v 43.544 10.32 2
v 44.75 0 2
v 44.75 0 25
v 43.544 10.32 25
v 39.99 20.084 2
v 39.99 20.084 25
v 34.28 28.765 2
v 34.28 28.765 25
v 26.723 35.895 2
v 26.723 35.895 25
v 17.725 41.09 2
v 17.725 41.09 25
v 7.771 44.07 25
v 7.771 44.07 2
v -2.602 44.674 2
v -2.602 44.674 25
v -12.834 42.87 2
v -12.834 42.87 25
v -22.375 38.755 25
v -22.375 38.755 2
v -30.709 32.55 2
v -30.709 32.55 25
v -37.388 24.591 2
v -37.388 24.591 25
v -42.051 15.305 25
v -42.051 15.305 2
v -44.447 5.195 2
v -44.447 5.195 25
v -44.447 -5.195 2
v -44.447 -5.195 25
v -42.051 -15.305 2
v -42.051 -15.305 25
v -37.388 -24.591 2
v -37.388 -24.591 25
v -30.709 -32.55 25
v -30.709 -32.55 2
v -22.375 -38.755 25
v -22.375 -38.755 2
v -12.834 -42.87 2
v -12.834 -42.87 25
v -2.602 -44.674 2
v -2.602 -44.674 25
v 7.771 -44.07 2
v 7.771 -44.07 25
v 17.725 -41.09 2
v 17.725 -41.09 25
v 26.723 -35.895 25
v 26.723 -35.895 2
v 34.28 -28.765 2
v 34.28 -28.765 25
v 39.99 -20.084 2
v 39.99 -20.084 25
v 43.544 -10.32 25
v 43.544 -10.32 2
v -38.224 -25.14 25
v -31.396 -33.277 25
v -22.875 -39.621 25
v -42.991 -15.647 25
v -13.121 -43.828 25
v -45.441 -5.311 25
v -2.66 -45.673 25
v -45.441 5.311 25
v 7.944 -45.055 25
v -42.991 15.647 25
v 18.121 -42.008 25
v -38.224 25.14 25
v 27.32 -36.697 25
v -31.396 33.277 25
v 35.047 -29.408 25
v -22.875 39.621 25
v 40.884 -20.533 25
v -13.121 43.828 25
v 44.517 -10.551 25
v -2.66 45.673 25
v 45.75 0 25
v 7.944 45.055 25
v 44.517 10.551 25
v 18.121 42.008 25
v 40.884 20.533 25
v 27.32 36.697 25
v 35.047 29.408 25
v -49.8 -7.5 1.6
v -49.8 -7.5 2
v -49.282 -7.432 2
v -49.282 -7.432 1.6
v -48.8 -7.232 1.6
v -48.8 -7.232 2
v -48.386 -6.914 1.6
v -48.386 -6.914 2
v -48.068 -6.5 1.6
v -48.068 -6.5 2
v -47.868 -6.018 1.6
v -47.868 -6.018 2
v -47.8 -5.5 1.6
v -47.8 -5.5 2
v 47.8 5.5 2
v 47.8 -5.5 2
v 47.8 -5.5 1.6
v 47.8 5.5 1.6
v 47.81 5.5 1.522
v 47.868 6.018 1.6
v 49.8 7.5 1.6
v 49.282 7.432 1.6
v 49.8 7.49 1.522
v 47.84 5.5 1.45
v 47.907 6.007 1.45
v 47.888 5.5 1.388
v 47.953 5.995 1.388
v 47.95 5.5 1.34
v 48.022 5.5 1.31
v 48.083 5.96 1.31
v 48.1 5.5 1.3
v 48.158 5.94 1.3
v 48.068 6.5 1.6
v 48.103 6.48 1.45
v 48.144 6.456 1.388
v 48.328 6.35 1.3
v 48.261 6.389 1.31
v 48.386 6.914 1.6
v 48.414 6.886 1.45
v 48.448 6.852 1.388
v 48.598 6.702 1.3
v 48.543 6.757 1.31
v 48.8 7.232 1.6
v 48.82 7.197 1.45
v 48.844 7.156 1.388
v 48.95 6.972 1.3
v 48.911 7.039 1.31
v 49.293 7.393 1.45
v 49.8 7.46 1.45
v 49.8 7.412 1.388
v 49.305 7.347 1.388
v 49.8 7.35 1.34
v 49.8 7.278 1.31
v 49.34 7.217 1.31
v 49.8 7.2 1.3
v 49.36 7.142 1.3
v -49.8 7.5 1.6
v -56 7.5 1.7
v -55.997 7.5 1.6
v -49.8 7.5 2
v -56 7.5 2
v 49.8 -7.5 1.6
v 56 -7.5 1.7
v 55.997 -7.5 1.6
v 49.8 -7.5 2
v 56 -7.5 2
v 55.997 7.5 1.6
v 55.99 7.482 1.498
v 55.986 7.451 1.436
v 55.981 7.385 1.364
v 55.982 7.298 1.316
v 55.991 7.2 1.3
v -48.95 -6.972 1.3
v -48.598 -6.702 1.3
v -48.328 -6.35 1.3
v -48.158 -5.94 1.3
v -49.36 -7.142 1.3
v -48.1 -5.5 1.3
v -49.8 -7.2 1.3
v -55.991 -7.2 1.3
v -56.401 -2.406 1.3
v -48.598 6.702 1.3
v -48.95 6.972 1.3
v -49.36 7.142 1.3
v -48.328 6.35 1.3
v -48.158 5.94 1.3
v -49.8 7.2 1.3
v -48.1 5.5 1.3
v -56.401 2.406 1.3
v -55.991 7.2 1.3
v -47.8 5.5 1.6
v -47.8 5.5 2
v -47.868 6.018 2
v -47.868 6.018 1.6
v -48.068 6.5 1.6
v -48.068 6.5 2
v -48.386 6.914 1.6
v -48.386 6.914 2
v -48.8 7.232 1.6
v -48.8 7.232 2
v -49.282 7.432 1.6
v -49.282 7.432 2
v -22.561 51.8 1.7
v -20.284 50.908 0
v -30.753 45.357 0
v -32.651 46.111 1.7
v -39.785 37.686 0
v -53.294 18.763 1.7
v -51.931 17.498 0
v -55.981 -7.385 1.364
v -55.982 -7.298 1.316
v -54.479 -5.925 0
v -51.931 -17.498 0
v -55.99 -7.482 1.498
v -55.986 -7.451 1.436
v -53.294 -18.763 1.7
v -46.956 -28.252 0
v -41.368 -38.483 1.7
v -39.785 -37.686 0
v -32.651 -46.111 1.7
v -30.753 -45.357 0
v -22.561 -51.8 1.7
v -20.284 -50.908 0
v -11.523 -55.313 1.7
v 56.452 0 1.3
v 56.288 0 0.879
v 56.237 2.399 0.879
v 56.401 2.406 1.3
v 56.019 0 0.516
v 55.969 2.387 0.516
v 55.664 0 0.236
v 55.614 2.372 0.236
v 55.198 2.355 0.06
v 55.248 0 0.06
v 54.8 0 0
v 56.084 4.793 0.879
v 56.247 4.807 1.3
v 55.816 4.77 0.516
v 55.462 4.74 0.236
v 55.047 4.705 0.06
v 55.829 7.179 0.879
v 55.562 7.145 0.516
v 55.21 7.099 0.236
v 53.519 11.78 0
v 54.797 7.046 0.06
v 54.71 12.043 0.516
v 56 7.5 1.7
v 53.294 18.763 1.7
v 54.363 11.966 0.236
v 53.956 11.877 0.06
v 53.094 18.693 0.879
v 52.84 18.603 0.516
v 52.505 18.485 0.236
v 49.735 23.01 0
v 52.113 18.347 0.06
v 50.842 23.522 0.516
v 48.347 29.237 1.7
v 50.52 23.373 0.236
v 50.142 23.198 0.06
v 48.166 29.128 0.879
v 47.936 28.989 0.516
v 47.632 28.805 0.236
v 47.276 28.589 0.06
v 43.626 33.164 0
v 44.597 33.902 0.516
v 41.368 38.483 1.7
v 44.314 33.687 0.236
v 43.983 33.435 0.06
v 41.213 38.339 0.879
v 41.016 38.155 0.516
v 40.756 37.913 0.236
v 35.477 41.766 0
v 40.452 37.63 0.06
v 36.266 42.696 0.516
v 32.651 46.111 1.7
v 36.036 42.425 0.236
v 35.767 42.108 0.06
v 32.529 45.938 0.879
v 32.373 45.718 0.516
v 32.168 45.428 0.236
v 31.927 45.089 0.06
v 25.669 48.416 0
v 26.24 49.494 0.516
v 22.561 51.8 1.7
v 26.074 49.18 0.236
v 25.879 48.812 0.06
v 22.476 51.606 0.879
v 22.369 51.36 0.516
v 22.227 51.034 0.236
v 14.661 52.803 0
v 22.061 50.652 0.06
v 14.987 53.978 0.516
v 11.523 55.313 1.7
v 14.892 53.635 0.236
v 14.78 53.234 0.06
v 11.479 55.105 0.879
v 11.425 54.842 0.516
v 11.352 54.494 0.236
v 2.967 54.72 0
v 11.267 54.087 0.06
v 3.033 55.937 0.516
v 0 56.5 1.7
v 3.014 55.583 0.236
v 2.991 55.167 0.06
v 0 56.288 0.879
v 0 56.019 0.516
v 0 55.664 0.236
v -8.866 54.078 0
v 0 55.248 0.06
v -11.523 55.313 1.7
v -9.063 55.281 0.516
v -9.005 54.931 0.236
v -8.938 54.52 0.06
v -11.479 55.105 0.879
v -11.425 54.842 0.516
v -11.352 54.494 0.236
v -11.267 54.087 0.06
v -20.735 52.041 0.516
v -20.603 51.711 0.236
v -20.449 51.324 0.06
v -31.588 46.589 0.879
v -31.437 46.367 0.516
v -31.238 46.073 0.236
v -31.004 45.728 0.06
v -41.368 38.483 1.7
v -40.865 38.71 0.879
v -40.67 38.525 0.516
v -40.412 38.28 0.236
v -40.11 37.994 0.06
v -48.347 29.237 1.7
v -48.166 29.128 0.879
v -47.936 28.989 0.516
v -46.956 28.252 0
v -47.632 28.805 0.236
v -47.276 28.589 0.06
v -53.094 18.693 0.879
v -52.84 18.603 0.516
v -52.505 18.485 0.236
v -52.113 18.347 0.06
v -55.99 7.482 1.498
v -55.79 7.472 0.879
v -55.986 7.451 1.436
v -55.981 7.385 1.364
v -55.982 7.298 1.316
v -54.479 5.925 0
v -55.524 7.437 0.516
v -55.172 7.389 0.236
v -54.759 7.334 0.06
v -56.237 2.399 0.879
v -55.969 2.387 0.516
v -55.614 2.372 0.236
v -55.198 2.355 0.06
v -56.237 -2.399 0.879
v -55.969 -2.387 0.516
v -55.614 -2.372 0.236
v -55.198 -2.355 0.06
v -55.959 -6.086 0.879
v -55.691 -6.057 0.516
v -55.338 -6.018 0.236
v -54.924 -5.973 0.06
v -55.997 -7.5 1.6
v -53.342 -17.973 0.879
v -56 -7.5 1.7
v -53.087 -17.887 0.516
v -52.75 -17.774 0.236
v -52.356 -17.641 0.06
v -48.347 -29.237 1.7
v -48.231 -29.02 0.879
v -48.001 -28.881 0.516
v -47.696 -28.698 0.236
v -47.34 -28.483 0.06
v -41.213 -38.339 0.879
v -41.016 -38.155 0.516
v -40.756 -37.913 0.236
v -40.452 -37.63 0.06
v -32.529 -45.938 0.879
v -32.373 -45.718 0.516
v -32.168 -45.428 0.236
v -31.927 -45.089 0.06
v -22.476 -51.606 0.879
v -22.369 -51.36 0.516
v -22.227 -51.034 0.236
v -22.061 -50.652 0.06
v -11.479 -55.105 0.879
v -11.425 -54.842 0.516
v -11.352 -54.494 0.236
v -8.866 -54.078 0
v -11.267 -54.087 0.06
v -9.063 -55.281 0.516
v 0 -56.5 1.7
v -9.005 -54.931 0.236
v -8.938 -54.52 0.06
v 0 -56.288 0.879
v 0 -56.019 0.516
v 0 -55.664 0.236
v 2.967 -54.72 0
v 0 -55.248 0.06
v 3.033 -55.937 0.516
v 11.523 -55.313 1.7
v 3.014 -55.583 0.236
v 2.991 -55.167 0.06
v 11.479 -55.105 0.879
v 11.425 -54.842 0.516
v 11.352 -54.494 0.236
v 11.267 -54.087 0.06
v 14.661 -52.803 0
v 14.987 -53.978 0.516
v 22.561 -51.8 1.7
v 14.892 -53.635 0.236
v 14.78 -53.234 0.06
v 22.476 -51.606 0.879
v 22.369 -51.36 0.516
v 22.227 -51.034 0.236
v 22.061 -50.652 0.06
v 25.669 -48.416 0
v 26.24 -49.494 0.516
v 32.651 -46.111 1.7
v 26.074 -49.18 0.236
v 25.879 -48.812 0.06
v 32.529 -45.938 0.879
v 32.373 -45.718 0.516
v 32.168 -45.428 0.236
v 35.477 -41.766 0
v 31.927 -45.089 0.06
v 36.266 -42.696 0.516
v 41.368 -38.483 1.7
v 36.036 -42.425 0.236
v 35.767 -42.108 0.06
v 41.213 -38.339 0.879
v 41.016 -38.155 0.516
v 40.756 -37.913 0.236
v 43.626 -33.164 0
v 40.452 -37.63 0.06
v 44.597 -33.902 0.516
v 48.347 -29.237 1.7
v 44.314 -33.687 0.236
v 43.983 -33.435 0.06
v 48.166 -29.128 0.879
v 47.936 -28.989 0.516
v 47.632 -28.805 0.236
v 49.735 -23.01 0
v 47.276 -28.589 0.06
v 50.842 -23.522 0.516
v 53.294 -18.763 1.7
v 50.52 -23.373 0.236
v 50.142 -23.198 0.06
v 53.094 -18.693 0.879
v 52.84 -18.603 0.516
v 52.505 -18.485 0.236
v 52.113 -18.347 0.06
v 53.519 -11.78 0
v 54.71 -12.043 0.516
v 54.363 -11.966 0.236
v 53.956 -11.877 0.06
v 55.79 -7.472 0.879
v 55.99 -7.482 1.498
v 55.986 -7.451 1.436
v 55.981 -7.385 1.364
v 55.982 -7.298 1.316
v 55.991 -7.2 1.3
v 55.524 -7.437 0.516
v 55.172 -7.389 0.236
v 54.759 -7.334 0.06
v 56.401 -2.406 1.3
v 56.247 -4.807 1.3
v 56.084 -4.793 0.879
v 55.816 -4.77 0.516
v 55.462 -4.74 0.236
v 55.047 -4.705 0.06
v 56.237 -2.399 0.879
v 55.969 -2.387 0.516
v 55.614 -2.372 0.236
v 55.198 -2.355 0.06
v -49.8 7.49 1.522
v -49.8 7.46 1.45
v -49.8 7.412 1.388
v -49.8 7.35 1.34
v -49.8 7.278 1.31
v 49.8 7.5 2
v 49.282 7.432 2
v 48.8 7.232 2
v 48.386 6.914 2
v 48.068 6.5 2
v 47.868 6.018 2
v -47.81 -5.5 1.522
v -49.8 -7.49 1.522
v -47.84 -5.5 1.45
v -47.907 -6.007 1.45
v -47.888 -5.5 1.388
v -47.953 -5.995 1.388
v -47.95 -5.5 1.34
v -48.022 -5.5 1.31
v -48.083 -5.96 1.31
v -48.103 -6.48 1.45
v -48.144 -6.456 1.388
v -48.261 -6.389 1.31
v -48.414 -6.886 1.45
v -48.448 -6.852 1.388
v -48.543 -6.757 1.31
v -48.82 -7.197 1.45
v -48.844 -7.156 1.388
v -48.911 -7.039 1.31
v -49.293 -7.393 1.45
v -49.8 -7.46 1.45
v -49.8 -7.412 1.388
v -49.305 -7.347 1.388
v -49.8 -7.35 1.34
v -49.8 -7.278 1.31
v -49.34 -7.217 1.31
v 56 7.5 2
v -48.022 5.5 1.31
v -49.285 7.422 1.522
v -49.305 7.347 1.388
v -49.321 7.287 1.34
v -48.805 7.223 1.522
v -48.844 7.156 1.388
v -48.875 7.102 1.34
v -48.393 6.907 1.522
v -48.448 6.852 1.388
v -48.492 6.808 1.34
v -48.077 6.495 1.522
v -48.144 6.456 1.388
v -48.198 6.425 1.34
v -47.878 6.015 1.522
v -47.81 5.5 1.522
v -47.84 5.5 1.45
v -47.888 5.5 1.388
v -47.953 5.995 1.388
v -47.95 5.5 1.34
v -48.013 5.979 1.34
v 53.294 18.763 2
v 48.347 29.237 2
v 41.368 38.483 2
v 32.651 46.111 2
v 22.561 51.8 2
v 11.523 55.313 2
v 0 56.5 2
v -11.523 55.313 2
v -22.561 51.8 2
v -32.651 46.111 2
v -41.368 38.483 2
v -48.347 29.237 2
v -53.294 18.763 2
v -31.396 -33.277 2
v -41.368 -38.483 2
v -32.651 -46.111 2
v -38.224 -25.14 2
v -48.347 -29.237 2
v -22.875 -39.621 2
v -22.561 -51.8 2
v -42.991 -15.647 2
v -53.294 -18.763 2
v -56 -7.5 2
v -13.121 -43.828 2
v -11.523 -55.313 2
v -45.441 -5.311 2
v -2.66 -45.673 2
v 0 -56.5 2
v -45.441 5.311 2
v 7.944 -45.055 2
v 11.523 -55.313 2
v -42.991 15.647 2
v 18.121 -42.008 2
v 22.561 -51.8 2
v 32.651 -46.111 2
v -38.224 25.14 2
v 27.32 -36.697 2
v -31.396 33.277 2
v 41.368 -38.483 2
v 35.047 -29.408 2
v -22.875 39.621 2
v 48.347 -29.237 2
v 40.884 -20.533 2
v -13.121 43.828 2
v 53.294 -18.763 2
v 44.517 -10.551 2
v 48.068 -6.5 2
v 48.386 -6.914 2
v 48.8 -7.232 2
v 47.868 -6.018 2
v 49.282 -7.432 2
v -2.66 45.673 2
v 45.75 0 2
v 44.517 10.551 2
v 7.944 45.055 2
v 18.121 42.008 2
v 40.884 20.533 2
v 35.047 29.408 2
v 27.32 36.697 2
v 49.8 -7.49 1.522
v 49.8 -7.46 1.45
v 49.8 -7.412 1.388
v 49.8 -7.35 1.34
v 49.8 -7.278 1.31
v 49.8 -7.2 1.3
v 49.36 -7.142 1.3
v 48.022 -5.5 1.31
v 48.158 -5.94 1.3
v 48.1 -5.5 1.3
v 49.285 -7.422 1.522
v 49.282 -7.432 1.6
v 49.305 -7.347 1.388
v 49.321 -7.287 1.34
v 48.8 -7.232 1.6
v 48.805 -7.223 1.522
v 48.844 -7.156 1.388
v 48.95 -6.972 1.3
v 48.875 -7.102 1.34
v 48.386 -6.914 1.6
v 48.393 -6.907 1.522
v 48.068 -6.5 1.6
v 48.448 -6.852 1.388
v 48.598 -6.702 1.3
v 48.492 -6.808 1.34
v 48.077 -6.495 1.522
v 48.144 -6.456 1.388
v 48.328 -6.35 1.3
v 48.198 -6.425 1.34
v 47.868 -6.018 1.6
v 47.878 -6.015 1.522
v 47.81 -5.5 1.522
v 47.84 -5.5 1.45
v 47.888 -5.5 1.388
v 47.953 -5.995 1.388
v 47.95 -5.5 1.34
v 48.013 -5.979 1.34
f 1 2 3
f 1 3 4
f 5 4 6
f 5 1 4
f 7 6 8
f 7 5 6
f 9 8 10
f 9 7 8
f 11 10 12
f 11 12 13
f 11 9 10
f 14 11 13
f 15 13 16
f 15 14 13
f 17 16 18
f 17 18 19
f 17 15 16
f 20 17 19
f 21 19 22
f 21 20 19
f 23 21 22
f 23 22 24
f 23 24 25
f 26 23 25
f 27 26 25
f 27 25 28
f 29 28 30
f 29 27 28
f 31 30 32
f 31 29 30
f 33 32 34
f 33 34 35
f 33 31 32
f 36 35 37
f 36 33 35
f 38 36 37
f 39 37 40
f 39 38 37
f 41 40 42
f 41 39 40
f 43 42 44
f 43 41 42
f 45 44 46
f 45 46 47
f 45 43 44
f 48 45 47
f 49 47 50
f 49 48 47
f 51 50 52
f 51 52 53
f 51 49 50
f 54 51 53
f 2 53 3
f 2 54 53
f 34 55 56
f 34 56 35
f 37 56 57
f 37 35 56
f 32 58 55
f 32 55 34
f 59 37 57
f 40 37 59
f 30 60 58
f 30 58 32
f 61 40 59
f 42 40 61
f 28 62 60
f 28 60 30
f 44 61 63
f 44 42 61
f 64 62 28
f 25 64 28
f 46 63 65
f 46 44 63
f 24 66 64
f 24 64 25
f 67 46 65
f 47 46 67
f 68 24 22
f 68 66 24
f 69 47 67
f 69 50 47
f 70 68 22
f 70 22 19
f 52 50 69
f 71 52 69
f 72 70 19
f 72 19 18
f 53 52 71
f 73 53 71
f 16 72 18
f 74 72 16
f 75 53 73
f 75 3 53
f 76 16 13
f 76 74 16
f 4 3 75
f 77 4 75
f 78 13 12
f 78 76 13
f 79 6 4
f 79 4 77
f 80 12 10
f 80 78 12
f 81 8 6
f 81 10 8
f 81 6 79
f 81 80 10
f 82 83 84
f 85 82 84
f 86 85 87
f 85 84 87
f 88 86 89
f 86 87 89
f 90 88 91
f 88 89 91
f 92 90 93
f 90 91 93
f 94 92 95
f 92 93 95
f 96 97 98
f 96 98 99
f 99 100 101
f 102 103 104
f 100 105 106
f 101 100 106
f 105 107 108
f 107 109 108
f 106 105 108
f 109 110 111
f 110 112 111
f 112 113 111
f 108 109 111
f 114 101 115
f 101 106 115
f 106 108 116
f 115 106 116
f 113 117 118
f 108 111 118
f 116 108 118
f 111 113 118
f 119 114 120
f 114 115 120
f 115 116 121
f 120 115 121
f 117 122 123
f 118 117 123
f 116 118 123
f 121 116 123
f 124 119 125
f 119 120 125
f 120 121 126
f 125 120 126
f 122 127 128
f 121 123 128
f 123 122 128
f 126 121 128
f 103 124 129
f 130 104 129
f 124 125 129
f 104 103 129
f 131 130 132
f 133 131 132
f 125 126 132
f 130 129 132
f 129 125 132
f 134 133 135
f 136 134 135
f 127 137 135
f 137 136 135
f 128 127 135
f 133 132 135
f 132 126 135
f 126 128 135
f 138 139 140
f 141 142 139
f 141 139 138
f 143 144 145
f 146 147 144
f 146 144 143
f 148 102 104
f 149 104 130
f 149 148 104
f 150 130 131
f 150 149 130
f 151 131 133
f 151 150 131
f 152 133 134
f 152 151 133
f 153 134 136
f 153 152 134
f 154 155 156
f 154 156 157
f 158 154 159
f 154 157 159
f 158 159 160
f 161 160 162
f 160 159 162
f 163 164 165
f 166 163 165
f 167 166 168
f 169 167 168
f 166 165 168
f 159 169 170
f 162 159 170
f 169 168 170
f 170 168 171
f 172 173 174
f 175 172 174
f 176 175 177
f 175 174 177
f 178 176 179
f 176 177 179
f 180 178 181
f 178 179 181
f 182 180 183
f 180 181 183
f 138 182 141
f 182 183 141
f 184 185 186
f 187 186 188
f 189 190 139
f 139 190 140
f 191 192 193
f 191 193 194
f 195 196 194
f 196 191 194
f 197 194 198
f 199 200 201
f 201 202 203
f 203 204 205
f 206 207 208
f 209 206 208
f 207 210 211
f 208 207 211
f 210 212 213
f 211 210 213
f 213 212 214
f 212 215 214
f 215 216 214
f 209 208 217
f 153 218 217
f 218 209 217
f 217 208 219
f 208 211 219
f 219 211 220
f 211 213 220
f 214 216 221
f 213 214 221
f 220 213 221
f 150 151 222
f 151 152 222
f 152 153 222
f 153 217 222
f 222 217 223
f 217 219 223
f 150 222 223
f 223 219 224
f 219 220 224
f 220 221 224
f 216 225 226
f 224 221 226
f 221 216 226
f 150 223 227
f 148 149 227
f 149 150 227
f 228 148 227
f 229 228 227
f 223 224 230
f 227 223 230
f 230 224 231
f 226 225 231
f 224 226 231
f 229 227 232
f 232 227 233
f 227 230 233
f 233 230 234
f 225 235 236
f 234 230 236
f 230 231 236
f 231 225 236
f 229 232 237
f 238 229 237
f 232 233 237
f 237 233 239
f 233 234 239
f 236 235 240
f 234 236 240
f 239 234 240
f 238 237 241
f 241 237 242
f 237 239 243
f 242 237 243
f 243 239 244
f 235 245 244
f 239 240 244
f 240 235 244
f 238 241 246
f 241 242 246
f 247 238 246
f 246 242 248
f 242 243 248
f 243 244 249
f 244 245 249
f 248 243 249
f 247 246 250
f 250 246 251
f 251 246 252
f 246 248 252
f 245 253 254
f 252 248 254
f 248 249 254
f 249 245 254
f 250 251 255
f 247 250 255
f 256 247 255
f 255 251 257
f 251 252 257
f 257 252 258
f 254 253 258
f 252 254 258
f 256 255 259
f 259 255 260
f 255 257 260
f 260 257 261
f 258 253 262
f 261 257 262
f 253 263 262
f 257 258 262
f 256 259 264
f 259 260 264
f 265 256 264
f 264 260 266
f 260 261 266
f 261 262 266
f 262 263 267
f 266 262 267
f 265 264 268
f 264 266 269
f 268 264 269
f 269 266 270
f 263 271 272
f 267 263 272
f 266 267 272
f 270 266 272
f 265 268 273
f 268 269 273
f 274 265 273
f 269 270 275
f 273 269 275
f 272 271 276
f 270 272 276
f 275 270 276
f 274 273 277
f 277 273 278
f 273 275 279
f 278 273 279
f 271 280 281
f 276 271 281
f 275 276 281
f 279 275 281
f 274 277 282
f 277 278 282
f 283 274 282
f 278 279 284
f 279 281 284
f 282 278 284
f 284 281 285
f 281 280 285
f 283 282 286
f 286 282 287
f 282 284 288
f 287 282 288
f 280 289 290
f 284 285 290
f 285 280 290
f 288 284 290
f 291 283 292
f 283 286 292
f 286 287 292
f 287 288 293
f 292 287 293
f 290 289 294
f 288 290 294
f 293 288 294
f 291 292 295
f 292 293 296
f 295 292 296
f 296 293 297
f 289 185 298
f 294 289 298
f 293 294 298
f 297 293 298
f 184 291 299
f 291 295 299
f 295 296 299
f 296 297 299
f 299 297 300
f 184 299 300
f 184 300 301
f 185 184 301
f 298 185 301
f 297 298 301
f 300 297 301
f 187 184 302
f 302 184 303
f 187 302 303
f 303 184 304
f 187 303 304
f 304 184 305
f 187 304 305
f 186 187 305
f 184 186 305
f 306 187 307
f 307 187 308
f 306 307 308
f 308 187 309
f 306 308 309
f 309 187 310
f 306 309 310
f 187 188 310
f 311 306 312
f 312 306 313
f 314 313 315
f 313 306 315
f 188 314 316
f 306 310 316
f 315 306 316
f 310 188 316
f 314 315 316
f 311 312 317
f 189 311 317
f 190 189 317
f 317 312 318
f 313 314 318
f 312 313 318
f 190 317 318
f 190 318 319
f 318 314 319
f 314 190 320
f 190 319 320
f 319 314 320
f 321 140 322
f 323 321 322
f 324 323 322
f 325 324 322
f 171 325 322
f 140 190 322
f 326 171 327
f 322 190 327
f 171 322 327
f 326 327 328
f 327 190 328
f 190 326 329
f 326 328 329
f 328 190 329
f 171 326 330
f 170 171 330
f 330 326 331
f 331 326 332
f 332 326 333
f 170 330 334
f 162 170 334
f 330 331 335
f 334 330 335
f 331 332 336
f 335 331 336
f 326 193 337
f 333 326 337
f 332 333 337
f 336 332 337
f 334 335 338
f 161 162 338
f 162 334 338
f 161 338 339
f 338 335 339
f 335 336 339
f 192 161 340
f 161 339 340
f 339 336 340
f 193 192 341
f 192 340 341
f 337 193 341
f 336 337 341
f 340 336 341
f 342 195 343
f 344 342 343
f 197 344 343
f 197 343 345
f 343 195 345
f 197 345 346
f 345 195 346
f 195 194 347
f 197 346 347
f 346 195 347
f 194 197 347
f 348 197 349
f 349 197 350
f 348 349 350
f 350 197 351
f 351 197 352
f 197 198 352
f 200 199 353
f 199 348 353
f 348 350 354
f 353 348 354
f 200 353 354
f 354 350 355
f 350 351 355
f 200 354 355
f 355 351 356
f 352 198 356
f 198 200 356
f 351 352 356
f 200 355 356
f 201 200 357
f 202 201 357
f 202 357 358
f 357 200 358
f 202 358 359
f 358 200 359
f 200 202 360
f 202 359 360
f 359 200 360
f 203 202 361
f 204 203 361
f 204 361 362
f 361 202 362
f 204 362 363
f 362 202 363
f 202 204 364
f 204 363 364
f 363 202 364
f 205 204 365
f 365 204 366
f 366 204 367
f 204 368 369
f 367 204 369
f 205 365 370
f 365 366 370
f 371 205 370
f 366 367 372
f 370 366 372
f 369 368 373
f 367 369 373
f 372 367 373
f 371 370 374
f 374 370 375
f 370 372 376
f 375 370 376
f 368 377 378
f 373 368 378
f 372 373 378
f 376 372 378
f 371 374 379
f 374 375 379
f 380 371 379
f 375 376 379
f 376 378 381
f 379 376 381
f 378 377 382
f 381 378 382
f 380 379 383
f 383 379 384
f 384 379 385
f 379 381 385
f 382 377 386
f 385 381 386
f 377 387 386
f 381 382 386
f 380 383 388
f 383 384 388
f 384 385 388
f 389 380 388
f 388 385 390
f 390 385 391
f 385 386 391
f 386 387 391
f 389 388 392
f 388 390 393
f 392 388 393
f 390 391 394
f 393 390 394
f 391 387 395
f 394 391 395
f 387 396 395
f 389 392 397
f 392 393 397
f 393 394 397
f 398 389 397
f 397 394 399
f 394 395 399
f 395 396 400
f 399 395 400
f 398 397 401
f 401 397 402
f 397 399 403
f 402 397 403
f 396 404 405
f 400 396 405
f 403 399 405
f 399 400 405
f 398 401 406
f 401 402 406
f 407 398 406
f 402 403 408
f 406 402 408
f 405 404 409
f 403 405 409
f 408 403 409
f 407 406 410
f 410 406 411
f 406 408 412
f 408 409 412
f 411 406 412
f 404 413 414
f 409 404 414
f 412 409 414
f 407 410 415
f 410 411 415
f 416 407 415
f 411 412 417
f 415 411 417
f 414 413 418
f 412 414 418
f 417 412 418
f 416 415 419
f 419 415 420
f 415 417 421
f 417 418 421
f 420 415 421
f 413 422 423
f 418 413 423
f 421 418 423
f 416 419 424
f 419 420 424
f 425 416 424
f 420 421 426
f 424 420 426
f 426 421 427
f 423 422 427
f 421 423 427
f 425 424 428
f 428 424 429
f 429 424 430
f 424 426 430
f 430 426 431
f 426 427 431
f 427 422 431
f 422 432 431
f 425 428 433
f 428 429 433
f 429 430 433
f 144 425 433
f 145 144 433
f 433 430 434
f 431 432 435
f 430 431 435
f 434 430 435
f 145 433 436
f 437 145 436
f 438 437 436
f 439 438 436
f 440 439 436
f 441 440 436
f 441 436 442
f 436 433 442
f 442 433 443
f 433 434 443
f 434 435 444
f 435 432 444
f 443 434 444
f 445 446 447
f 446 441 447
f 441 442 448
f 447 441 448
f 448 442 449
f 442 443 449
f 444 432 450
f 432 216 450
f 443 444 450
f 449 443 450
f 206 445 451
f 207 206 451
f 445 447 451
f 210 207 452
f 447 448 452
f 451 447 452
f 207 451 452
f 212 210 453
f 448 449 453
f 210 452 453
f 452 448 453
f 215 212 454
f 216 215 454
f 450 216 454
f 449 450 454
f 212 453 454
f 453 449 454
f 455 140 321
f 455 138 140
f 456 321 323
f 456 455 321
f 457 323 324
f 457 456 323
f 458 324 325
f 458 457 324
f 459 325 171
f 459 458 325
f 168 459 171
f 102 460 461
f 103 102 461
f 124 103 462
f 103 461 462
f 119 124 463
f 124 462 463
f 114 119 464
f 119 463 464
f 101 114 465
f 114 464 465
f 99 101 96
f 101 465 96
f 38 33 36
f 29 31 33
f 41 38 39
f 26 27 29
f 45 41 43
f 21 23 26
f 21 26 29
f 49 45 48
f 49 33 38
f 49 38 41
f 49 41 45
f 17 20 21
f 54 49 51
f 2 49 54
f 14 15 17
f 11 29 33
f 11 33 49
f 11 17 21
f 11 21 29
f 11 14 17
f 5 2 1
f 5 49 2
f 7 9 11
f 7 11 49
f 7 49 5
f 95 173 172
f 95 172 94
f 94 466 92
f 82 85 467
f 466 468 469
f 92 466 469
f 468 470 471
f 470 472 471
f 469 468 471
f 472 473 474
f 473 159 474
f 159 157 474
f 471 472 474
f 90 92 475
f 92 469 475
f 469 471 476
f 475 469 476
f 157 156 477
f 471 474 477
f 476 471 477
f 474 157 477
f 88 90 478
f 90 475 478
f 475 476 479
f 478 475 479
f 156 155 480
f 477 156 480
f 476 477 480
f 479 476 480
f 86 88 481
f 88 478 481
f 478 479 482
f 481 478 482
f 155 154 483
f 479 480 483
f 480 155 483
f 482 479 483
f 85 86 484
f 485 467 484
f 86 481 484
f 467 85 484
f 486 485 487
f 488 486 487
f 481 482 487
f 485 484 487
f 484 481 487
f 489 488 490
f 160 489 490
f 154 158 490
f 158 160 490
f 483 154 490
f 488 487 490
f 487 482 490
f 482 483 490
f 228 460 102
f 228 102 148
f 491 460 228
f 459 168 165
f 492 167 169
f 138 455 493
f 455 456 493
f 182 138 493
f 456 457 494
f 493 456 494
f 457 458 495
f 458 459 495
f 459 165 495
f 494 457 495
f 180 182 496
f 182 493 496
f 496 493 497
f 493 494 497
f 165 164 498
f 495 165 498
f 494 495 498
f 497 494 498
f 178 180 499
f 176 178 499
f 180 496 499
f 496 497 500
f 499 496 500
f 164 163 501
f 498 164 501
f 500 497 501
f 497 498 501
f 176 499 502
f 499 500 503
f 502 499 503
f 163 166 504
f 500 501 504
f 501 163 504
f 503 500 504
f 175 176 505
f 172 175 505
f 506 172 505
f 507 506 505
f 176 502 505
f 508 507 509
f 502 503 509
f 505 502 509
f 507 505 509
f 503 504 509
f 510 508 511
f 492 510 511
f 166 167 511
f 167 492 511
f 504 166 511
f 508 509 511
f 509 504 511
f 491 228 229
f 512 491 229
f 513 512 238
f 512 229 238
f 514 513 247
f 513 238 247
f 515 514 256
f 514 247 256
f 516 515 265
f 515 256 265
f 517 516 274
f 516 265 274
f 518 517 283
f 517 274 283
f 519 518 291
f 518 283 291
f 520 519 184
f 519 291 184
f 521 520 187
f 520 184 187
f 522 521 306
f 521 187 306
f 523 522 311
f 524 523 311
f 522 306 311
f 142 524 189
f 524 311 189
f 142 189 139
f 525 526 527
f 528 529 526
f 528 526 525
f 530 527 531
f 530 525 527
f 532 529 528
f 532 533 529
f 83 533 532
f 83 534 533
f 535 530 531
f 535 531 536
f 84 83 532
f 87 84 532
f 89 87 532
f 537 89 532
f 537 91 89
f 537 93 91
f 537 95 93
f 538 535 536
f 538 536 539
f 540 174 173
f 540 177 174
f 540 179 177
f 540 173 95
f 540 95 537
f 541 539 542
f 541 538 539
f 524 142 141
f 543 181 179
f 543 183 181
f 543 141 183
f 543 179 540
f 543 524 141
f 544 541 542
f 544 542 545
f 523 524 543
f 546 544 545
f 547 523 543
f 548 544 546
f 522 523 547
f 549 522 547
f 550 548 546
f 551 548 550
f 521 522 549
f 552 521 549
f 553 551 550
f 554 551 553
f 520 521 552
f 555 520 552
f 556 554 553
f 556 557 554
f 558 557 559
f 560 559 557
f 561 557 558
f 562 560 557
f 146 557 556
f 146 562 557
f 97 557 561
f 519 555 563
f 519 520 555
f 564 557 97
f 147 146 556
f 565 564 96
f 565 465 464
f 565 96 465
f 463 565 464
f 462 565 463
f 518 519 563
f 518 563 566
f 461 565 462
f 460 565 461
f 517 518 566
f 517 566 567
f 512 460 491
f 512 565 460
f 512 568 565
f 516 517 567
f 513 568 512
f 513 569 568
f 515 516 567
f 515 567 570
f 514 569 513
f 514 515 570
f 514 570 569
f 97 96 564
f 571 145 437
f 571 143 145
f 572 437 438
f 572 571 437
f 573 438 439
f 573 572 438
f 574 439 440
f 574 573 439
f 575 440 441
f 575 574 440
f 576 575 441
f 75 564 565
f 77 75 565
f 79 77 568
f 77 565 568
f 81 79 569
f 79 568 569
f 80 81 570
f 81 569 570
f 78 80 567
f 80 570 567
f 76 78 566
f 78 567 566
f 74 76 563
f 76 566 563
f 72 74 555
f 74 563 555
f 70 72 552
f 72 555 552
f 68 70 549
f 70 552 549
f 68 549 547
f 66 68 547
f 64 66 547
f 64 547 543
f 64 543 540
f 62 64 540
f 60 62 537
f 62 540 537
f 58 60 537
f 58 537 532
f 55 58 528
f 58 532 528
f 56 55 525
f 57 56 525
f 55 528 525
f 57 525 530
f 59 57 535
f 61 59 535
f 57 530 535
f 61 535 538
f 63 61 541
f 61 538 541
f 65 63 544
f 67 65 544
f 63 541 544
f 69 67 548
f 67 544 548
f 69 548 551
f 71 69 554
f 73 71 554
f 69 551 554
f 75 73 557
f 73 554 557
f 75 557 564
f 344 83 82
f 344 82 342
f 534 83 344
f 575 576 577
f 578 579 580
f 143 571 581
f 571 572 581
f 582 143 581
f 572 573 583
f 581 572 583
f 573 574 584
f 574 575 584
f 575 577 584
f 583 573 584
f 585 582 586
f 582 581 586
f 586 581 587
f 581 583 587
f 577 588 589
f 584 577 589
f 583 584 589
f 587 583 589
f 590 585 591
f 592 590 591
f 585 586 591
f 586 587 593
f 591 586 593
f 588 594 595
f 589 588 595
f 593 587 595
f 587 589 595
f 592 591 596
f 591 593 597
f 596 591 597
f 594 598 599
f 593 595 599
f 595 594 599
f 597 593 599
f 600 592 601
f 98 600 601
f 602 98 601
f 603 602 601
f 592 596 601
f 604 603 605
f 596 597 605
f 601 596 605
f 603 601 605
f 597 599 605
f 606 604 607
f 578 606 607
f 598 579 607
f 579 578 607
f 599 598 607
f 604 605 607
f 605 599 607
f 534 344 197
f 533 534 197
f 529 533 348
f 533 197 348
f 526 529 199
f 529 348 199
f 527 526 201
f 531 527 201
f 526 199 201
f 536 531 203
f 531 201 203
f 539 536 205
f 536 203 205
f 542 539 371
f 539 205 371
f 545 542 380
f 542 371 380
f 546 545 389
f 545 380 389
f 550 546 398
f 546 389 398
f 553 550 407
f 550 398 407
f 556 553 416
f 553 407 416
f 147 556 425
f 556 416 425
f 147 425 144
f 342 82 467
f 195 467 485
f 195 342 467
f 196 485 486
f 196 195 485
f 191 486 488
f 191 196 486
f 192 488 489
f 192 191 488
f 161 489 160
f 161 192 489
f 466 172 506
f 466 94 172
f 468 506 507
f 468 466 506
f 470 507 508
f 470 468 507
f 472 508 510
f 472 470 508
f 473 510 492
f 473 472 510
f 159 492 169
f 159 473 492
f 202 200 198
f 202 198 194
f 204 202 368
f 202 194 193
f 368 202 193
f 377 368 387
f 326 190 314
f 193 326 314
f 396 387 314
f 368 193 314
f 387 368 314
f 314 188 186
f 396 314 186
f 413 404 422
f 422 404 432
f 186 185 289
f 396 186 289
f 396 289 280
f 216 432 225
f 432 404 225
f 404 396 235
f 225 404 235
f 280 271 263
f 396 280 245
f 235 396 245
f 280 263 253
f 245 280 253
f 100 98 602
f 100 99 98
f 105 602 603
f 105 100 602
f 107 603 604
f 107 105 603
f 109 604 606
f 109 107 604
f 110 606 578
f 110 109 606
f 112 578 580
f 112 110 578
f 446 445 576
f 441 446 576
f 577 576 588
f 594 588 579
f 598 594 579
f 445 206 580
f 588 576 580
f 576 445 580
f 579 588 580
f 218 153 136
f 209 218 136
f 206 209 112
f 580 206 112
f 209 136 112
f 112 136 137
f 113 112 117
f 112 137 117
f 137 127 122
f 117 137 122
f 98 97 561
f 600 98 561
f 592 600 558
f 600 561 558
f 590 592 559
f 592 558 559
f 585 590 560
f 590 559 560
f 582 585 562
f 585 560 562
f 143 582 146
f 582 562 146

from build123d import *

# Parameters (mm, degrees)
SKETCH_R      = 56.5
PAD_DEPTH     = 2
FILLET_R      = 1.7
SKETCH001_R   = 45.75
SKETCH001_R_2 = 44.75
PAD001_DEPTH  = 23
POCKET_DEPTH  = 0.7
FILLET001_R   = 0.3


with BuildPart() as part:
    # Sketch → Pad (new body)
    with BuildSketch(Plane.XY):
        Circle(SKETCH_R)
    extrude(amount=PAD_DEPTH)

    # Fillet
    fillet_edges = [part.edges().sort_by_distance(p)[0] for p in [
        (-56.5, 0, 0),
    ]]
    fillet(fillet_edges, radius=FILLET_R)

    # Sketch001 (on Face3 of Fillet) → Pad001 (join)
    with BuildSketch(Plane.XY.offset(2)):
        Circle(SKETCH001_R)
        Circle(SKETCH001_R_2, mode=Mode.SUBTRACT)
    extrude(amount=PAD001_DEPTH)

    # Sketch002 (on Face3 of Pad001) → Pocket (cut)
    with BuildSketch(Plane.XY.offset(2)):
        with BuildLine():
            Line((-64, 7.5), (-49.8, 7.5))
            ThreePointArc((-47.8, 5.5), (-48.385786, 6.914214), (-49.8, 7.5))
            Line((-47.8, 5.5), (-47.8, -5.5))
            ThreePointArc((-49.8, -7.5), (-48.385786, -6.914214), (-47.8, -5.5))
            Line((-49.8, -7.5), (-64, -7.5))
            Line((-64, -7.5), (-64, 7.5))
        make_face()
        with BuildLine():
            Line((49.8, 7.5), (64.06, 7.5))
            Line((64.06, 7.5), (64.06, -7.5))
            Line((64.06, -7.5), (49.8, -7.5))
            ThreePointArc((47.8, -5.5), (48.385786, -6.914214), (49.8, -7.5))
            Line((47.8, -5.5), (47.8, 5.5))
            ThreePointArc((49.8, 7.5), (48.385786, 6.914214), (47.8, 5.5))
        make_face()
    extrude(amount=-POCKET_DEPTH, mode=Mode.SUBTRACT)

    # Fillet001
    fillet001_edges = [part.edges().sort_by_distance(p)[0] for p in [
        (52.875922, 7.5, 1.3),
        (48.385786, 6.914214, 1.3),
        (47.8, 0, 1.3),
        (48.385786, -6.914214, 1.3),
        (52.875922, -7.5, 1.3),
        (-52.875922, 7.5, 1.3),
        (-48.385786, 6.914214, 1.3),
        (-47.8, 0, 1.3),
        (-48.385786, -6.914214, 1.3),
        (-52.875922, -7.5, 1.3),
    ]]
    fillet(fillet001_edges, radius=FILLET001_R)


solid = part.part
